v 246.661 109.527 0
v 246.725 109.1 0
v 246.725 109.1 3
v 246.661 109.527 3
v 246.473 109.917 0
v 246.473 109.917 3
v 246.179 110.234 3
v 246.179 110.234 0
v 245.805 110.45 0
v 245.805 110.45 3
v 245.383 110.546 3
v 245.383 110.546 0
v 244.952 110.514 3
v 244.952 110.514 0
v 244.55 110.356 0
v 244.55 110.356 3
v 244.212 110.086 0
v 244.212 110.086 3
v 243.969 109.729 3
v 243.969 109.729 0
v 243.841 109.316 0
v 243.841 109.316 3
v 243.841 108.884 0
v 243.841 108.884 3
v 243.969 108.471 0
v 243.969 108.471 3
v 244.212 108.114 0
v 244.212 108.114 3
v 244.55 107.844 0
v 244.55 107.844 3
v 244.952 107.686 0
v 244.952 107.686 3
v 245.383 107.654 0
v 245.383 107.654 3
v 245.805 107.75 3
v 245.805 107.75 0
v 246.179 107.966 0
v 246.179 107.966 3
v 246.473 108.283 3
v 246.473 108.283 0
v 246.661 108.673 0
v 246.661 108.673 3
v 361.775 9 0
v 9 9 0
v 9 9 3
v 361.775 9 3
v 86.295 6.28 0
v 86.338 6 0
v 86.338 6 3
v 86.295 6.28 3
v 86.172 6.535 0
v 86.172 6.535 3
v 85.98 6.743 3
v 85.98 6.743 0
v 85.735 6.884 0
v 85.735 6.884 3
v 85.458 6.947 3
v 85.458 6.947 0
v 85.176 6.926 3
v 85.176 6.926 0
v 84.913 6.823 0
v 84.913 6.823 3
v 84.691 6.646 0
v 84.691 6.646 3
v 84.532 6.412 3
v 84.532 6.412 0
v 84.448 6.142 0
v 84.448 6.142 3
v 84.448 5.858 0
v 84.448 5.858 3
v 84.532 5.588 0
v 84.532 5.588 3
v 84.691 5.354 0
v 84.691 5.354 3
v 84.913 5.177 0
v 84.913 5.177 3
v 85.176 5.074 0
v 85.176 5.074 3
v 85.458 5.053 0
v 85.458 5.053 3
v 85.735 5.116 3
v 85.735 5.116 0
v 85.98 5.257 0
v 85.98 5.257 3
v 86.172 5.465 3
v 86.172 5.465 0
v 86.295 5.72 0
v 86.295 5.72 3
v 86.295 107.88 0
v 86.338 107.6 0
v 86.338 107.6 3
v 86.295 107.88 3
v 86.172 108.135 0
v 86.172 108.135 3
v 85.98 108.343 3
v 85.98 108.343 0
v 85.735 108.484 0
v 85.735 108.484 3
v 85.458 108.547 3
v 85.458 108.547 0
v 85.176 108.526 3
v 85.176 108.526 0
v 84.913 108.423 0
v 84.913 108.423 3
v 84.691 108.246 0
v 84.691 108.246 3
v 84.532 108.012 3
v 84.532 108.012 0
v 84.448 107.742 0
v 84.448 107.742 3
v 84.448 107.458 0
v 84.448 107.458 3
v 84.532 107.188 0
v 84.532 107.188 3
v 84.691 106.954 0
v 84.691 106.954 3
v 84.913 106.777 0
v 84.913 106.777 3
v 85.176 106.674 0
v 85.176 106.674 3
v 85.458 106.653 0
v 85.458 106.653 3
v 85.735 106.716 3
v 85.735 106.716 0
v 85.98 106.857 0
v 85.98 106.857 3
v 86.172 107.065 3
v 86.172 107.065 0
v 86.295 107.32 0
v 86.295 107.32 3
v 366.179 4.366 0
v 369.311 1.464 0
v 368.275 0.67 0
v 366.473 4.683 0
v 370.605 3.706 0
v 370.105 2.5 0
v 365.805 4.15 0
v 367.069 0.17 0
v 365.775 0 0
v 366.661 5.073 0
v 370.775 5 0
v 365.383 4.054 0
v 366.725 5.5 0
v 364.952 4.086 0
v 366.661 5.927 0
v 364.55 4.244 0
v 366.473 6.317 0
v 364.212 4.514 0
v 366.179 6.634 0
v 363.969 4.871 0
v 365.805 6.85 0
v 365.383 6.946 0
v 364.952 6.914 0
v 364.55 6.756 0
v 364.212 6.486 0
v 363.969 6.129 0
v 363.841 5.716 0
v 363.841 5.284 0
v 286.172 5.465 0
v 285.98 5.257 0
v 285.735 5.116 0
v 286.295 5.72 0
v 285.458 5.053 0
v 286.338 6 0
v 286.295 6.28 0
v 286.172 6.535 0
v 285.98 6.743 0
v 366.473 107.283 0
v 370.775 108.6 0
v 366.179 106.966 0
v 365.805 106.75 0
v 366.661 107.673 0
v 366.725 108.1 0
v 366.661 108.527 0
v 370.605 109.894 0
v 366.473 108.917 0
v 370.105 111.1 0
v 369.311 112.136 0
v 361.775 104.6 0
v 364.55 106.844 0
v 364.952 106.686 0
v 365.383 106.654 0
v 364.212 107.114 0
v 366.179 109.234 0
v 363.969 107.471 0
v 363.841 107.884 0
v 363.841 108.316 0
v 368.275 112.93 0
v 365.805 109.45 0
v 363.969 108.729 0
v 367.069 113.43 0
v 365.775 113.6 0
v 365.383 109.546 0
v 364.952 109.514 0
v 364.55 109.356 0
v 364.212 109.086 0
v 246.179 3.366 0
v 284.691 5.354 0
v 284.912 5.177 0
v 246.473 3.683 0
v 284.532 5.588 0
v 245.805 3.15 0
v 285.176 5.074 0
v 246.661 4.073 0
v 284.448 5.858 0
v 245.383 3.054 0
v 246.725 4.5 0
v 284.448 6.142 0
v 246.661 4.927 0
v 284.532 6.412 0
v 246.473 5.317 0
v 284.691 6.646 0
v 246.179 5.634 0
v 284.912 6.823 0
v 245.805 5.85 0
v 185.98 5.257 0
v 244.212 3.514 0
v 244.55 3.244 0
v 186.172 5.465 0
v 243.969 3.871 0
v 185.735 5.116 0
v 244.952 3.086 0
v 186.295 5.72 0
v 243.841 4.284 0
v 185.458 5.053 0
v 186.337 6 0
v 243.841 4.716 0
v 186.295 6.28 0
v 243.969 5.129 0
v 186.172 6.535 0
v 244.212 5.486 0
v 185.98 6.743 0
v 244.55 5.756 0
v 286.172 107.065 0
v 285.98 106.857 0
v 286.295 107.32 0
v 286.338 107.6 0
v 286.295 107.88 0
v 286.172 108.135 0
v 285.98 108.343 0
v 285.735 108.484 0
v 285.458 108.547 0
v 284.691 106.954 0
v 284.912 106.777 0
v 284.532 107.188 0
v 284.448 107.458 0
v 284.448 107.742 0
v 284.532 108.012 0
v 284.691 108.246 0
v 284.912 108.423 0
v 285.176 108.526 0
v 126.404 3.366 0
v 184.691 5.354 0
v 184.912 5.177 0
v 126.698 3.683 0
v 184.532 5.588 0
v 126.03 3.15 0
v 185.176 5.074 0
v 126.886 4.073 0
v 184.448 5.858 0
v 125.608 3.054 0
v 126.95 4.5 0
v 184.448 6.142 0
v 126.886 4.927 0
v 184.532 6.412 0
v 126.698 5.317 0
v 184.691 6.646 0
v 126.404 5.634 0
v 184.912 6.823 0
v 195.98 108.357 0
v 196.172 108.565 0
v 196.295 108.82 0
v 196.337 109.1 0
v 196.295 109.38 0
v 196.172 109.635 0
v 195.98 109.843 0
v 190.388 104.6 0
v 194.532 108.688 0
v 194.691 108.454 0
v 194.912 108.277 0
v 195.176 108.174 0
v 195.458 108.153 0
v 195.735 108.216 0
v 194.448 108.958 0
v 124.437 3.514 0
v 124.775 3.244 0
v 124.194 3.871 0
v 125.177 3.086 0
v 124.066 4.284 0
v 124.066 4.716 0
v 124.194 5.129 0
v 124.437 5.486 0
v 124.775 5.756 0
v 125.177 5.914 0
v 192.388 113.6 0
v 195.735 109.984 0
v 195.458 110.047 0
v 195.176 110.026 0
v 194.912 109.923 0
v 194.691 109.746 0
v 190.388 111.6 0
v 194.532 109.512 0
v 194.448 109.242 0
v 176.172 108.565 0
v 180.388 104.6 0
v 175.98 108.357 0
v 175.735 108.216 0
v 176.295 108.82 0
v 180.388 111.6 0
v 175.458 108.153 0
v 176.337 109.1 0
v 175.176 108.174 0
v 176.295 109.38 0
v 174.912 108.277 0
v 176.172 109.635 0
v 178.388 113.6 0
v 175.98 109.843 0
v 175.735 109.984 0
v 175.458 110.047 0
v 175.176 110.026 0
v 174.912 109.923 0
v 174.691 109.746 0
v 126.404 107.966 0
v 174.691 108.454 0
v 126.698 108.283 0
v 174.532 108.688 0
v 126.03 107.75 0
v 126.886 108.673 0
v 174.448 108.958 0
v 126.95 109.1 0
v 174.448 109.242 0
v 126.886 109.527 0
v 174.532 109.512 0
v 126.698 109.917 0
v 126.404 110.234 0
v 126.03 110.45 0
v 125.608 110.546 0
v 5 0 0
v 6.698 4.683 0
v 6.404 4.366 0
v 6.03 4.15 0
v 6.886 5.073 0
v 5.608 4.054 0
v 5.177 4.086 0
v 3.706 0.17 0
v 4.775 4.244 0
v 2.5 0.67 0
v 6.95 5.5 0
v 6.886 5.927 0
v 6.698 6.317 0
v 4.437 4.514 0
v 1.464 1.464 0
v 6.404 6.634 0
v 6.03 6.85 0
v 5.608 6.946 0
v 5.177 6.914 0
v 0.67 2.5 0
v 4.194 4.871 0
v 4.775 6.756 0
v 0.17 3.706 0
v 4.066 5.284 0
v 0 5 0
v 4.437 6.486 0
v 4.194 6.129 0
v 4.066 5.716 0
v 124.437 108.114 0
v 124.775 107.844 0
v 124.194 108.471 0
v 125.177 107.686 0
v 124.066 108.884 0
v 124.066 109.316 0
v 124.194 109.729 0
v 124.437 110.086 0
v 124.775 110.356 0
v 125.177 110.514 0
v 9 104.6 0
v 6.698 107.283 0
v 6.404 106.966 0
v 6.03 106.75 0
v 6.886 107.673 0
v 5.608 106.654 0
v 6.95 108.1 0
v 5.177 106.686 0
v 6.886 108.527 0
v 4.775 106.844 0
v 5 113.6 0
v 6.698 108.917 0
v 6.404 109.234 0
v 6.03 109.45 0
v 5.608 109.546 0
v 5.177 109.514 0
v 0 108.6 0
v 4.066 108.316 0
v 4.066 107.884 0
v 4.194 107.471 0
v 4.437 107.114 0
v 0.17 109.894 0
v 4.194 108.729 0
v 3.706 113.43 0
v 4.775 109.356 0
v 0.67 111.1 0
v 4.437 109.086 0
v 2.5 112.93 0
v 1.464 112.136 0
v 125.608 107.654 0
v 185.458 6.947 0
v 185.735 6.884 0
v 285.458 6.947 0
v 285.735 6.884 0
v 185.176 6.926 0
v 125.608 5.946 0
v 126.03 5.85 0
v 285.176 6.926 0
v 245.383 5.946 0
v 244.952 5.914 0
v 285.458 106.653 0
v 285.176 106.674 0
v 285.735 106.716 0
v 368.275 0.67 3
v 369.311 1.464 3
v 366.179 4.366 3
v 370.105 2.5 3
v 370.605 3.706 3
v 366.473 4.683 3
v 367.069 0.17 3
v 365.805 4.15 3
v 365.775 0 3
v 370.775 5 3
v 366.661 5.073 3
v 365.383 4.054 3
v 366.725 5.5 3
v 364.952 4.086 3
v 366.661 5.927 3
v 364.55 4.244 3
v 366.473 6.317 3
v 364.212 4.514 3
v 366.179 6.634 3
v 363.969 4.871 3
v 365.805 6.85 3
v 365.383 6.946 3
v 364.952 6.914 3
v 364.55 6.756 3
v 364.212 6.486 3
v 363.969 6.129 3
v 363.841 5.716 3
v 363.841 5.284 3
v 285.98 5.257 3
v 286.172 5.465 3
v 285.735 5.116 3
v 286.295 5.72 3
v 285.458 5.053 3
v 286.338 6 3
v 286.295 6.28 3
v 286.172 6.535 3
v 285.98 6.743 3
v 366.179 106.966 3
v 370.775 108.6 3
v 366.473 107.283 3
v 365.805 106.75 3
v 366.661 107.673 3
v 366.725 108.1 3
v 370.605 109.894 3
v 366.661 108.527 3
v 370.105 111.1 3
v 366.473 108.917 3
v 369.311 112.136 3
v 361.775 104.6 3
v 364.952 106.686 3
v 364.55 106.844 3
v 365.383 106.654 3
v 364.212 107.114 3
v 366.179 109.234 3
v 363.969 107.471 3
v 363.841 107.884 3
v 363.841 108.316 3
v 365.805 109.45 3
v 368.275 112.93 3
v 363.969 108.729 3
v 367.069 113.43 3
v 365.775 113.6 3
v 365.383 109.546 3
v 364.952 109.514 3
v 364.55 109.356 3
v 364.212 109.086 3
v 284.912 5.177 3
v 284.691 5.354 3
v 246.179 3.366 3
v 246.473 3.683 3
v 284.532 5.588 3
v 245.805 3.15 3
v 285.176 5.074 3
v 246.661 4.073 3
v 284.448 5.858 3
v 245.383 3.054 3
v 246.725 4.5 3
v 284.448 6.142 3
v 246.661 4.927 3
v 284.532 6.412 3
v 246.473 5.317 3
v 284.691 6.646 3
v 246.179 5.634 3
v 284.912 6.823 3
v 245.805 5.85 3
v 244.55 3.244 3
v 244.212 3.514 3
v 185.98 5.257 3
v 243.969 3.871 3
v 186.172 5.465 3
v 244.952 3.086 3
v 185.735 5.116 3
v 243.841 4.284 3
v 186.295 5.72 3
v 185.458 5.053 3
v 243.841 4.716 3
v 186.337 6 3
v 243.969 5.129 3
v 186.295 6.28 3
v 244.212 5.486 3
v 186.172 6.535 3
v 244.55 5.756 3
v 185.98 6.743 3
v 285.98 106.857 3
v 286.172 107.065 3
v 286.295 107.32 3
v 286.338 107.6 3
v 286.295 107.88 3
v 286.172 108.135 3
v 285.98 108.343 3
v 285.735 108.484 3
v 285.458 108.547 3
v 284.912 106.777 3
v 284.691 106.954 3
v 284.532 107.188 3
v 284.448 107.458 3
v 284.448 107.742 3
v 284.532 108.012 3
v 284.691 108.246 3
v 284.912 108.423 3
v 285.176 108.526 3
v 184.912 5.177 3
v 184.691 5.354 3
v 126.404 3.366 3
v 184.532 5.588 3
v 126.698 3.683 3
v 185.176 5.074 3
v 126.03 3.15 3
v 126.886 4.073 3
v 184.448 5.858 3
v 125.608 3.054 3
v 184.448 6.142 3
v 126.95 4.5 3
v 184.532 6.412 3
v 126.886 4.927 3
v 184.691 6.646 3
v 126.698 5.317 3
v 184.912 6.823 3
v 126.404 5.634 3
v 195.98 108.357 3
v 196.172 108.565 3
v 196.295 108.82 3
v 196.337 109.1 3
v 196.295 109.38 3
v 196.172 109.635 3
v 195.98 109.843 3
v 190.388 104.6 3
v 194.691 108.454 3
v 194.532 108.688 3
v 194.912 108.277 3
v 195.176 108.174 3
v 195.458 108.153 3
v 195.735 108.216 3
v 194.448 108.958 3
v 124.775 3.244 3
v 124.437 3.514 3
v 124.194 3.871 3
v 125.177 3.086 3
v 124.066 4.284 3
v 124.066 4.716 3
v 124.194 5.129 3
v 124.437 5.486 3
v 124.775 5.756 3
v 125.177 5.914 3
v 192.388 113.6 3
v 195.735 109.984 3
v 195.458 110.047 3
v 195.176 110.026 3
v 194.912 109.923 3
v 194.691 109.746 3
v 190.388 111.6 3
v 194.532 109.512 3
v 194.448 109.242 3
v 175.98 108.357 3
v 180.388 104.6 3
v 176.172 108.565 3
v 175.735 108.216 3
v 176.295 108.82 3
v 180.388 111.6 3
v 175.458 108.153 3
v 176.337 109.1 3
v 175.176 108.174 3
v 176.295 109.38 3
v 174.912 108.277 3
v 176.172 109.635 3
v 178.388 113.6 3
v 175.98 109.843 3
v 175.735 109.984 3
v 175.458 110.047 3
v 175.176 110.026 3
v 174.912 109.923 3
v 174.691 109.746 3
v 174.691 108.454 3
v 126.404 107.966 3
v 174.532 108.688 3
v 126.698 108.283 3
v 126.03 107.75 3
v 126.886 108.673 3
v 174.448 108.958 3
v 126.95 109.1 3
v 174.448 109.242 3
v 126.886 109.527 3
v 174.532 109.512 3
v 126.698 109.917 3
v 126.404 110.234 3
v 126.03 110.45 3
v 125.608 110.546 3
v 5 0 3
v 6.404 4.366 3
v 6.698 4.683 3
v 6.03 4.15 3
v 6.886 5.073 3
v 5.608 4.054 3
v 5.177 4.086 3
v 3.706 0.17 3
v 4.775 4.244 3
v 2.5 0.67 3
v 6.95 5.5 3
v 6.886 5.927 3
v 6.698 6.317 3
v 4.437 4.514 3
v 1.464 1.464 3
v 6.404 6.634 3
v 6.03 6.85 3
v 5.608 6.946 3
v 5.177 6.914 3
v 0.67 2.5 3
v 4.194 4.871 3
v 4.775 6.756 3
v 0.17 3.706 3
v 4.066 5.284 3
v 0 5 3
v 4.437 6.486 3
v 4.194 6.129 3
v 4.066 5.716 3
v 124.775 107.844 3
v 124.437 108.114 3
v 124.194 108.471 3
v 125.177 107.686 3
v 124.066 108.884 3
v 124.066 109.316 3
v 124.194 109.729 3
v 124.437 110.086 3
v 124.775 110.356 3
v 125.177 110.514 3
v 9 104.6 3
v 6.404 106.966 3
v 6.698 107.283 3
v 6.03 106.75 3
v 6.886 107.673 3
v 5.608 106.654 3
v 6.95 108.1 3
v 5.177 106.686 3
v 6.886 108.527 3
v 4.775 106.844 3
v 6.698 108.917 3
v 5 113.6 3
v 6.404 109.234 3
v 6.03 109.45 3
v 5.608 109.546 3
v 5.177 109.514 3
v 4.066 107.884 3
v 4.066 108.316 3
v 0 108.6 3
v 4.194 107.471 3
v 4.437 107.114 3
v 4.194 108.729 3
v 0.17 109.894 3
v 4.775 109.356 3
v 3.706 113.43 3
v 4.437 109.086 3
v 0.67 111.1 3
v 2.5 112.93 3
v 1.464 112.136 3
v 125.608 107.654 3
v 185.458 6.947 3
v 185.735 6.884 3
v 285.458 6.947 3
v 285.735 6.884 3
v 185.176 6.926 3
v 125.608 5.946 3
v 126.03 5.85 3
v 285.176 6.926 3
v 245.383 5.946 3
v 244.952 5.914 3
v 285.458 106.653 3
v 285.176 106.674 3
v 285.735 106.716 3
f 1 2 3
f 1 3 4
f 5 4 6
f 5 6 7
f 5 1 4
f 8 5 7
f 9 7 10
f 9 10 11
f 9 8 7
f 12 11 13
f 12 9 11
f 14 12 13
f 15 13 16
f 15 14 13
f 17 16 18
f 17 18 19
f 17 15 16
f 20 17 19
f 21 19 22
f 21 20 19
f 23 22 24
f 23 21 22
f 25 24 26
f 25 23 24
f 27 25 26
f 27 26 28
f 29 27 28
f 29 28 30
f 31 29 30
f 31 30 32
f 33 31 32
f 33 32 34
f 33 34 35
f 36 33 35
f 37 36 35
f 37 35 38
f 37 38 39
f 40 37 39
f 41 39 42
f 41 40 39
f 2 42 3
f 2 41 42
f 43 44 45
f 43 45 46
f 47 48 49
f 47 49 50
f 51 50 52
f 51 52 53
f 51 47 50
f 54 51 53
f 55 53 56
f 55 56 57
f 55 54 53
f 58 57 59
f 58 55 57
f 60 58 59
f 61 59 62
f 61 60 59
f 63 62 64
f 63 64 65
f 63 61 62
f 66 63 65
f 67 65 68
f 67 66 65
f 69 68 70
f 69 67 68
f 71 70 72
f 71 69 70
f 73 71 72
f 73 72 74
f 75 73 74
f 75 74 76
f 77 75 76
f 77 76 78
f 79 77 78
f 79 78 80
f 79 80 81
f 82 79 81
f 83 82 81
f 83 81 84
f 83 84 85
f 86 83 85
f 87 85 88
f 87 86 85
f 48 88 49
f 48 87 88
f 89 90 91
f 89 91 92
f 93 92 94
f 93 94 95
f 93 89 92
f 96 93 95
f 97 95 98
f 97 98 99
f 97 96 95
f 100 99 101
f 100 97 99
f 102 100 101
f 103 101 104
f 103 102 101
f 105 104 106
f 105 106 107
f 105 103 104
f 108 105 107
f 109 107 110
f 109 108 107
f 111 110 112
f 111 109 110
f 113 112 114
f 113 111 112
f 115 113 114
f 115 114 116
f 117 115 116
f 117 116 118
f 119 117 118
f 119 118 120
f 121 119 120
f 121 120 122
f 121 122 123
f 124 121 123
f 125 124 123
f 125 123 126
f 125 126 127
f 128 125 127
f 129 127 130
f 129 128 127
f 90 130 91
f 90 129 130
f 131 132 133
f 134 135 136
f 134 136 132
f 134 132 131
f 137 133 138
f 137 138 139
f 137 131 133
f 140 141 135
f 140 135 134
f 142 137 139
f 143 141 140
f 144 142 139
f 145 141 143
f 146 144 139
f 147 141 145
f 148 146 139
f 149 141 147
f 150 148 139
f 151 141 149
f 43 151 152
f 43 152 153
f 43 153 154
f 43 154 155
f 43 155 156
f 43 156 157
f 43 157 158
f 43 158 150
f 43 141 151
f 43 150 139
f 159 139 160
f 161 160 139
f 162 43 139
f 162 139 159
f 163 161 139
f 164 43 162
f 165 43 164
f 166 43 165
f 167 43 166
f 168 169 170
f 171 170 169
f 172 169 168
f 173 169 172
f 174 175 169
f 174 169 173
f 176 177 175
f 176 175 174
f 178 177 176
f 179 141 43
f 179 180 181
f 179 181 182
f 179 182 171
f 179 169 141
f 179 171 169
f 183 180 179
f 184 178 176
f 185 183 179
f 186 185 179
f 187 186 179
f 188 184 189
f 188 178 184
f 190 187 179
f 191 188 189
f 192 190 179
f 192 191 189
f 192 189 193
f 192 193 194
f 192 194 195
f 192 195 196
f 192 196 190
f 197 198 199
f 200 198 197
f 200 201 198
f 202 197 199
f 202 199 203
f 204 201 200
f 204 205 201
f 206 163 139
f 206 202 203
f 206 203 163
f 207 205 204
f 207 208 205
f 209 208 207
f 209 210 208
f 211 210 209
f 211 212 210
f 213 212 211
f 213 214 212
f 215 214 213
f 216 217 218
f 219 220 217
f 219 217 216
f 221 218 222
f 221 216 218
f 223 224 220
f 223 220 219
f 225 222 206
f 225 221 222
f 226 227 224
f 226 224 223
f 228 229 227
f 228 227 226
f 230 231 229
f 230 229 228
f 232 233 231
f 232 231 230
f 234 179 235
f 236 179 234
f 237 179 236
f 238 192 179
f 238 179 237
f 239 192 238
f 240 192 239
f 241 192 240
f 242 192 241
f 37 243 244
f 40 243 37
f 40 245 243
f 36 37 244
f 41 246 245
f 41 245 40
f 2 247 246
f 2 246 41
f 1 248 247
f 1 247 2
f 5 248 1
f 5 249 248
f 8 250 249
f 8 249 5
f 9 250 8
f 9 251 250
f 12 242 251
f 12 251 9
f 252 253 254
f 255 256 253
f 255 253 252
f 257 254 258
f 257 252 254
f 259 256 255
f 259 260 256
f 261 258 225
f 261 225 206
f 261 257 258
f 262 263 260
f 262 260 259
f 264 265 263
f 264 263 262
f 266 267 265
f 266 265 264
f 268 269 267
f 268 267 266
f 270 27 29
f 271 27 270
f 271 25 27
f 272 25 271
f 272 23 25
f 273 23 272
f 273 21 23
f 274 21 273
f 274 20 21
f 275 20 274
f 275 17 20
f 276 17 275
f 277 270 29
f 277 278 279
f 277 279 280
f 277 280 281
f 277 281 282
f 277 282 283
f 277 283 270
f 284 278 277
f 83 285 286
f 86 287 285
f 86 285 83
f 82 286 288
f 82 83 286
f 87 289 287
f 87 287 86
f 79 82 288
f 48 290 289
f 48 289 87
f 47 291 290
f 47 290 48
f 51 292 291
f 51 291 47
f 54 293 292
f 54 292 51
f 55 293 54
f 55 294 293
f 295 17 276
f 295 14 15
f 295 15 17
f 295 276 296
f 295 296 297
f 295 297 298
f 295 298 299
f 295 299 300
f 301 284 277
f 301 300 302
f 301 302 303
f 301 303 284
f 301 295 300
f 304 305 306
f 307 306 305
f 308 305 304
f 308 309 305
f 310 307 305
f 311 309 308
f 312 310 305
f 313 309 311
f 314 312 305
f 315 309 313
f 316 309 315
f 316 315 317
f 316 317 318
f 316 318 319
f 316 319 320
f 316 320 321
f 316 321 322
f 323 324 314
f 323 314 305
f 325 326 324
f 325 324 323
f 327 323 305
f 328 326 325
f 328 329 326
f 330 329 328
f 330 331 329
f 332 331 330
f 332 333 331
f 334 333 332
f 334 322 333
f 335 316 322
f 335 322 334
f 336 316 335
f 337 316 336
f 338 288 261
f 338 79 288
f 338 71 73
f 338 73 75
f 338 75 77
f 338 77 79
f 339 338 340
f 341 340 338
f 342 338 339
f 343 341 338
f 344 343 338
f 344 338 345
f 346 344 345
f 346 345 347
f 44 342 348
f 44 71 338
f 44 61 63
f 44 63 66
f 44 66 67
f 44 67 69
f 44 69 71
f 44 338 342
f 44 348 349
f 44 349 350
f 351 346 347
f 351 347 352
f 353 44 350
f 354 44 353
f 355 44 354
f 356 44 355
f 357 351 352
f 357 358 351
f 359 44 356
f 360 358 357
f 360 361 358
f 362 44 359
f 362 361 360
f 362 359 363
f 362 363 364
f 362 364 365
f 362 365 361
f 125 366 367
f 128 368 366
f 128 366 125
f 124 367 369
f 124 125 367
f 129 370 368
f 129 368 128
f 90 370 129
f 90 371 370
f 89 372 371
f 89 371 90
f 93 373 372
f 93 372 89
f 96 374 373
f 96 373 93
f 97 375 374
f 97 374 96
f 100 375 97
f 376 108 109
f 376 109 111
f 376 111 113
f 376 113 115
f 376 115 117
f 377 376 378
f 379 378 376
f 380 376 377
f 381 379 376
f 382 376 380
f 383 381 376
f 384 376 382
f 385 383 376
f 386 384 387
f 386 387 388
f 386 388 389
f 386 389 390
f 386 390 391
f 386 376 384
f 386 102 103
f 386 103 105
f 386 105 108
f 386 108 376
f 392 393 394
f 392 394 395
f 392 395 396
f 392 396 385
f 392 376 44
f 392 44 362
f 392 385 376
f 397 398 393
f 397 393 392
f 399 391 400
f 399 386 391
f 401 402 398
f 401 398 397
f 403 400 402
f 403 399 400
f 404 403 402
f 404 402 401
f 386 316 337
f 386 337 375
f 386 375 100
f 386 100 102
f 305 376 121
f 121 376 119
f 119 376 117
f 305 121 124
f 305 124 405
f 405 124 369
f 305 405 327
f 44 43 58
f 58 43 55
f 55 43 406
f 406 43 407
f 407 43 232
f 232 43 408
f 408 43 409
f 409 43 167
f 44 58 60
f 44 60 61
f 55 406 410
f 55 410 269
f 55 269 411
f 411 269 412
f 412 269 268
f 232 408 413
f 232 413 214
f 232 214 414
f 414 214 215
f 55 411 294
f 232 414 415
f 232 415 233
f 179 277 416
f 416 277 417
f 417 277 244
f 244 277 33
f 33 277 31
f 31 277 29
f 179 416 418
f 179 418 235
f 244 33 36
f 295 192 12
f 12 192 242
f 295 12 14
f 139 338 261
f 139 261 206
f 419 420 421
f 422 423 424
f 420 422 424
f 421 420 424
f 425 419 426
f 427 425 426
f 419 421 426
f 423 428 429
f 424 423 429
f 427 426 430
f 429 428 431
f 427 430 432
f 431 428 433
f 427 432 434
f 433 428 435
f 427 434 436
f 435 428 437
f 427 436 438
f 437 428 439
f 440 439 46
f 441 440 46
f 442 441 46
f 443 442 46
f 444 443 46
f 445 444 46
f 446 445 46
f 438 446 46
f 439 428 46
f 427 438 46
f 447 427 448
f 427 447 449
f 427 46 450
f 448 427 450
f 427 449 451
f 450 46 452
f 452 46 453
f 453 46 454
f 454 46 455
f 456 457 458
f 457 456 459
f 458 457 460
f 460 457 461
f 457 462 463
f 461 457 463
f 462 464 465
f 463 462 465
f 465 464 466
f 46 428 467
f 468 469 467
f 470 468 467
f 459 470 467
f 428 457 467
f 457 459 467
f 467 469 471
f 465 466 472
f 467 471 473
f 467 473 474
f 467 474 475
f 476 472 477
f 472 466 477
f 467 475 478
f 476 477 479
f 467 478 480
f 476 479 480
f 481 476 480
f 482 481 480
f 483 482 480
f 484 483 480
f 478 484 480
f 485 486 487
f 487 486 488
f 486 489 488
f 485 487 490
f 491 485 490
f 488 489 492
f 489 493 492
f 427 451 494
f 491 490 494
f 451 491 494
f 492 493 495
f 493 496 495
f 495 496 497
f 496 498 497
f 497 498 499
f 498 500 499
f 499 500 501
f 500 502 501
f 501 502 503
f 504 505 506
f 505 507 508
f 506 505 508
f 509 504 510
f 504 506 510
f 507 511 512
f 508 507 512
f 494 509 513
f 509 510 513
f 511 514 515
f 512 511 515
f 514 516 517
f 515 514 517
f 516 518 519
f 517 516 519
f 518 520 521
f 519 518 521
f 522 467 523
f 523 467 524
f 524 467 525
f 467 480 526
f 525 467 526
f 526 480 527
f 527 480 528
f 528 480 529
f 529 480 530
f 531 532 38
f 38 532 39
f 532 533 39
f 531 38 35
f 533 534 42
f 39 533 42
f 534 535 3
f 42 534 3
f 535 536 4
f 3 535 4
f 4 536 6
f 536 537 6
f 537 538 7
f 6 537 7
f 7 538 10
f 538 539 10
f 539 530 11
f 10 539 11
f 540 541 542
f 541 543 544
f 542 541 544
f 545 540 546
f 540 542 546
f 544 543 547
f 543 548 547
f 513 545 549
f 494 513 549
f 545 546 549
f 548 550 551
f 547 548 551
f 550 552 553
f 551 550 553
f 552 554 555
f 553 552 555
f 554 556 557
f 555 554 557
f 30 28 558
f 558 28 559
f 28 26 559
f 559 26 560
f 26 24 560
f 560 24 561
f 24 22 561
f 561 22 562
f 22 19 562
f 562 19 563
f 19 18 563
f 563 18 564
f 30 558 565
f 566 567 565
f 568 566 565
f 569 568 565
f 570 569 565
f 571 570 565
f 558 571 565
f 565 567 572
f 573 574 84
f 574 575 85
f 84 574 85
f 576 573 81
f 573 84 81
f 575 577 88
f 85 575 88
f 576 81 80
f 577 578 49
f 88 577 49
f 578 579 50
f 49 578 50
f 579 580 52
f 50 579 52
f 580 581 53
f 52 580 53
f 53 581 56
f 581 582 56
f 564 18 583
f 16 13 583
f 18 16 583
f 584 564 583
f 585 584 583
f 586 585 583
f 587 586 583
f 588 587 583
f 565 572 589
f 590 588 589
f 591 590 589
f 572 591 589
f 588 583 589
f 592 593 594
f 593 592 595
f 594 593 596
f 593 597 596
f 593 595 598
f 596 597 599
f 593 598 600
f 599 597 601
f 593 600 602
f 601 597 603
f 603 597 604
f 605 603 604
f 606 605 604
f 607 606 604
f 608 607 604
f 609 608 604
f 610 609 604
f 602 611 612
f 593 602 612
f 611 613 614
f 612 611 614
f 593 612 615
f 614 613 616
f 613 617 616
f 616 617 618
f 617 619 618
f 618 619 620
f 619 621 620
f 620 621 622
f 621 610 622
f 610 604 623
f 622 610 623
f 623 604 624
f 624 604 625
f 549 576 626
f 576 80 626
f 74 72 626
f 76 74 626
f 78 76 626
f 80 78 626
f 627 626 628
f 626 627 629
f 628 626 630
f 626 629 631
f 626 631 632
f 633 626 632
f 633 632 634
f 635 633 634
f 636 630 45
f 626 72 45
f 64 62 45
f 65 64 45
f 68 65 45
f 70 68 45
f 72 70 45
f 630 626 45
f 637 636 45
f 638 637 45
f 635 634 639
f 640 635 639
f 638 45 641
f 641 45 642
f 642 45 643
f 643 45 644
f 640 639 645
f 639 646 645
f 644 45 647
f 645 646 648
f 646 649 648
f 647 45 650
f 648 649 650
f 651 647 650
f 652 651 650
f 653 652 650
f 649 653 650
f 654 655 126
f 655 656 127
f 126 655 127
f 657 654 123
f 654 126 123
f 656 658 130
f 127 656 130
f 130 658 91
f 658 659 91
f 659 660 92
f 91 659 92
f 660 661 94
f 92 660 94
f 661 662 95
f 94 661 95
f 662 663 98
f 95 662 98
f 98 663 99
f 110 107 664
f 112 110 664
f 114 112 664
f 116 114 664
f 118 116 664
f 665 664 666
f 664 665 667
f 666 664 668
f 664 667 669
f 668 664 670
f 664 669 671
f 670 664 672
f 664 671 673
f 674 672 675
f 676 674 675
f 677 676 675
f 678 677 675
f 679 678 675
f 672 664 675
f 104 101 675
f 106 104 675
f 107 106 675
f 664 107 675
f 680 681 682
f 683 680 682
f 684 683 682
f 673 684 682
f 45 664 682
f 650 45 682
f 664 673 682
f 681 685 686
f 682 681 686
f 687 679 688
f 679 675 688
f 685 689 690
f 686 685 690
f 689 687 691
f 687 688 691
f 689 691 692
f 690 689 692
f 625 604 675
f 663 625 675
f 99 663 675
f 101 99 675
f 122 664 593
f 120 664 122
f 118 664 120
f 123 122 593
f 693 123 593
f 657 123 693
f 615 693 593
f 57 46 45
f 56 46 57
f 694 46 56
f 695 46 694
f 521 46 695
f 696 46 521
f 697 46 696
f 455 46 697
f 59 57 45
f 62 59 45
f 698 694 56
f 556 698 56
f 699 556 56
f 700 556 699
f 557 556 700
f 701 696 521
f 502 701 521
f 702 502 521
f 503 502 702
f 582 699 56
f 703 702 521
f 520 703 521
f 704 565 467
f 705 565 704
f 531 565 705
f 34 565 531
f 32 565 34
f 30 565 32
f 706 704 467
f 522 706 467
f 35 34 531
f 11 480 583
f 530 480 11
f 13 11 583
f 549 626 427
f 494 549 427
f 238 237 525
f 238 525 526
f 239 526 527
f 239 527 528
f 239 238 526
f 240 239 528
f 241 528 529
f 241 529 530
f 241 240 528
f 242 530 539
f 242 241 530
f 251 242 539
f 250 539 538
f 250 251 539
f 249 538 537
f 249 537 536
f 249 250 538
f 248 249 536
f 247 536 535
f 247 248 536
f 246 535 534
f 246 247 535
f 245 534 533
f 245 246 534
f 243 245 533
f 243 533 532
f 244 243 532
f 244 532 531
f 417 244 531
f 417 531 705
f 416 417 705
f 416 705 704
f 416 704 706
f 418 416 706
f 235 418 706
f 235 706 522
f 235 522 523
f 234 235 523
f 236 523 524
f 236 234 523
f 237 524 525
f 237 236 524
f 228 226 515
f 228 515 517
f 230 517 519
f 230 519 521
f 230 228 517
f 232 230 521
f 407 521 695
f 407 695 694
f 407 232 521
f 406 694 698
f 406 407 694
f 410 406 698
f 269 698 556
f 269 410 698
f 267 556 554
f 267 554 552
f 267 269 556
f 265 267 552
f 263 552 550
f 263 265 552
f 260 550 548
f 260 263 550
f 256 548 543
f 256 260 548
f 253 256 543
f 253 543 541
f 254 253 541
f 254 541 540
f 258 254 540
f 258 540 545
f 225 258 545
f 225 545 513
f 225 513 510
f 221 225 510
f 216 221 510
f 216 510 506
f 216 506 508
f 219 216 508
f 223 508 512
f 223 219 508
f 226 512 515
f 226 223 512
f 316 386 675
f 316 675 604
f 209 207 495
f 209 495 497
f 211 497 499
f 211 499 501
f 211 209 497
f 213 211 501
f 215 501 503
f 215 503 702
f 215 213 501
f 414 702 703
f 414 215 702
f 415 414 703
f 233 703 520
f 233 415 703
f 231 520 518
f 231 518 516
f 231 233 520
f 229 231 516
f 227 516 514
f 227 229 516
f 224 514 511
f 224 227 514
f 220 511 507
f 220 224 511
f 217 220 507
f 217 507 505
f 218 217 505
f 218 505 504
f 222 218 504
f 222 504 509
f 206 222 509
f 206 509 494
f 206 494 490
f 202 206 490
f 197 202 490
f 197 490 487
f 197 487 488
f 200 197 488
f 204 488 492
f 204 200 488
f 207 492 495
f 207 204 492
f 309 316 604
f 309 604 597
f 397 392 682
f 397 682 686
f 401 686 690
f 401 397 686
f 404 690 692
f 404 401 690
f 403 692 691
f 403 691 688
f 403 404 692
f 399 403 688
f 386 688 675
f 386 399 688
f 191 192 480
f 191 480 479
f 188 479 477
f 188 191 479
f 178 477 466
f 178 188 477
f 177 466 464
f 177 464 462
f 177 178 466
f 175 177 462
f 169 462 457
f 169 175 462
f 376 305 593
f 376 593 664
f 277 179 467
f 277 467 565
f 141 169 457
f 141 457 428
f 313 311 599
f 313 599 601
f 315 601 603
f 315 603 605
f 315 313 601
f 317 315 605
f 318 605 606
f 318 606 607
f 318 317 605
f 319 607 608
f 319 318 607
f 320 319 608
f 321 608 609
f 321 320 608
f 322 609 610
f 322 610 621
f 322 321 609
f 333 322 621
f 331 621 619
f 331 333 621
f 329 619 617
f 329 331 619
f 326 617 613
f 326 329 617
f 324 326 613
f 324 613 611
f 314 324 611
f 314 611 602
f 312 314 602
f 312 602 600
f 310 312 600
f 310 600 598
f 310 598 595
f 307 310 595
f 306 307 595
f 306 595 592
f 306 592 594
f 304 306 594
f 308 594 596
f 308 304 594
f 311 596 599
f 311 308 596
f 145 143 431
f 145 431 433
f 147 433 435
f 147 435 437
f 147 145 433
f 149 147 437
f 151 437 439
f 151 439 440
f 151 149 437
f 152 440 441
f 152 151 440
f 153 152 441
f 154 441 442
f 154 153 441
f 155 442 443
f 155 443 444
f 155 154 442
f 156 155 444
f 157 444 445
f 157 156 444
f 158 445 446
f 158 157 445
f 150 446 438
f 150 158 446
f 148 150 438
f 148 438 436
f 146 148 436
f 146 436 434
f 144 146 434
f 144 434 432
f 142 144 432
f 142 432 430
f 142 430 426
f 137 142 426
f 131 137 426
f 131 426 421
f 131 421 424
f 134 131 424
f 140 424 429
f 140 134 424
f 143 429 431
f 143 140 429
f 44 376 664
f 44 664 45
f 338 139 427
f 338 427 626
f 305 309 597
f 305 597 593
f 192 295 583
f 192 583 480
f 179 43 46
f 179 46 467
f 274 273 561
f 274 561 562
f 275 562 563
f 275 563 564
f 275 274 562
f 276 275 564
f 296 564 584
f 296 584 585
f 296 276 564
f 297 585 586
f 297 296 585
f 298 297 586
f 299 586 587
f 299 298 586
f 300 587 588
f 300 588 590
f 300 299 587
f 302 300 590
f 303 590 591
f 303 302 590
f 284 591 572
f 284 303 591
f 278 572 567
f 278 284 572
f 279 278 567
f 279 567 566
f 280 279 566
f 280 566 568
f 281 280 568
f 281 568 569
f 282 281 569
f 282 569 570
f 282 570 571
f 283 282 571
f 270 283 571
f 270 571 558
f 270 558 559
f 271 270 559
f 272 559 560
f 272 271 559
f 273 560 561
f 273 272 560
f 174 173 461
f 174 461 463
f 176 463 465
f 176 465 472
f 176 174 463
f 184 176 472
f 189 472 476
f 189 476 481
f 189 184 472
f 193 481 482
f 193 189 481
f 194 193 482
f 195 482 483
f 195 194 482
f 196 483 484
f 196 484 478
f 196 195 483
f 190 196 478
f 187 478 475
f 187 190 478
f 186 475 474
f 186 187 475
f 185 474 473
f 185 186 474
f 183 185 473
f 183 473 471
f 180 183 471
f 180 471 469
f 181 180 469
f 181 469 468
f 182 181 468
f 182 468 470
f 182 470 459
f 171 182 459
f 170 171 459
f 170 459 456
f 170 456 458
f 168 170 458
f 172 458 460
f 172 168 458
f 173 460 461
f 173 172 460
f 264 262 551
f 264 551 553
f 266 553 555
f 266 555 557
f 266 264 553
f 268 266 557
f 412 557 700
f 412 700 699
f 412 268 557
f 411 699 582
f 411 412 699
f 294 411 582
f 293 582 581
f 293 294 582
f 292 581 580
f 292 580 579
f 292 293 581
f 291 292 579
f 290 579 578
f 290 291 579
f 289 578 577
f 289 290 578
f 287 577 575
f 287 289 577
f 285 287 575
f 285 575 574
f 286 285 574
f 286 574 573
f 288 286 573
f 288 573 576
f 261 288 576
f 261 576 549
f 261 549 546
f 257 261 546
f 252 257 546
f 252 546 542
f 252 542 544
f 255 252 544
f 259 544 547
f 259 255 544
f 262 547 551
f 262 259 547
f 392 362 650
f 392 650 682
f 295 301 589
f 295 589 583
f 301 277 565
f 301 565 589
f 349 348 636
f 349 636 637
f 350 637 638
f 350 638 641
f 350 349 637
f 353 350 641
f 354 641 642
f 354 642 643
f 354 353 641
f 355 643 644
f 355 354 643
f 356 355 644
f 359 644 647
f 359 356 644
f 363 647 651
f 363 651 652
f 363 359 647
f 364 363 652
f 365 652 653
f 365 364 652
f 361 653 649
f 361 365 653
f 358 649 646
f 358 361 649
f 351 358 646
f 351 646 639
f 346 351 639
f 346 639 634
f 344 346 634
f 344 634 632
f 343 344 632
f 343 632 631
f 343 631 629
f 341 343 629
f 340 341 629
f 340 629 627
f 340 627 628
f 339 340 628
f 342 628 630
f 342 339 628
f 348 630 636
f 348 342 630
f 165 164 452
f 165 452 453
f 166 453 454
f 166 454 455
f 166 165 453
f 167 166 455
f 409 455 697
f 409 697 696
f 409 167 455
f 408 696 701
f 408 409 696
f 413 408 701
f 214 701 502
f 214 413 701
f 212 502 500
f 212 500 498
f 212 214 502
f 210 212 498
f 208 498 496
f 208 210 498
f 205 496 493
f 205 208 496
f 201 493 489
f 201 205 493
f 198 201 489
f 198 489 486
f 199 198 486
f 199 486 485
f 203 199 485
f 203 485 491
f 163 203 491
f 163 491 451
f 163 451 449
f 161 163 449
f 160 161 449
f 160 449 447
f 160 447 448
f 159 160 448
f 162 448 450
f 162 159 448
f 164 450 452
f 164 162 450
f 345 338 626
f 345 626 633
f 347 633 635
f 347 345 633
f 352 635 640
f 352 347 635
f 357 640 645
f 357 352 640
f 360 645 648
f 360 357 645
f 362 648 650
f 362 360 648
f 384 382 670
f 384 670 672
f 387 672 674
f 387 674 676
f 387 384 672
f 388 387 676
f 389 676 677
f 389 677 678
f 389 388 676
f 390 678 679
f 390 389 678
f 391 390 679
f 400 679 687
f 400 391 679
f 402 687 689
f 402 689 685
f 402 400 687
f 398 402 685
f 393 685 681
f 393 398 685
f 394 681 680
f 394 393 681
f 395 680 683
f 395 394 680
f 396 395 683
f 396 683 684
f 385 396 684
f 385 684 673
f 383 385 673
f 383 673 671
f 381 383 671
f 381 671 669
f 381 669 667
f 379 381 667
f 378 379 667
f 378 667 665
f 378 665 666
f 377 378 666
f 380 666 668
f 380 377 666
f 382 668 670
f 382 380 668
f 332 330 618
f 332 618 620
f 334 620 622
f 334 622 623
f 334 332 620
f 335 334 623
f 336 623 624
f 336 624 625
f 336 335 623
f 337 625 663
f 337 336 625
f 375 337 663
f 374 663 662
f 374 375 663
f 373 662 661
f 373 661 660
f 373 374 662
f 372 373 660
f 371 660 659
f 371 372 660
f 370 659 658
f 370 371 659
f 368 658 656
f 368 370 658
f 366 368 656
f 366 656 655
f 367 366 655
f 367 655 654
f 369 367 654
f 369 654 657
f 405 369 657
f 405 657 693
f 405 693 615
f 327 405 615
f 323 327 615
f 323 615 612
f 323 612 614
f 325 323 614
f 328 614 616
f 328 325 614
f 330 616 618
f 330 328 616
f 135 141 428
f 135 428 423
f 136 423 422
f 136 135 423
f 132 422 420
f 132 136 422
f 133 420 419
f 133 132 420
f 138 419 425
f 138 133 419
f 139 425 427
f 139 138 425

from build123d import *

# Parameters (mm, degrees)
MODEL_R             = 1.45
MODEL_R_2           = 0.95
BOSS_EXTRUDE1_DEPTH = 3


with BuildPart() as part:
    # Model → Boss-Extrude1 (new body)
    with BuildSketch(Plane.XY):
        with BuildLine():
            Line((5, 113.6), (178.3875, 113.6))
            Line((178.3875, 113.6), (180.3875, 111.6))
            Line((180.3875, 111.6), (180.3875, 104.6))
            Line((180.3875, 104.6), (9, 104.6))
            Line((9, 104.6), (9, 9))
            Line((9, 9), (361.775, 9))
            Line((361.775, 9), (361.775, 104.6))
            Line((361.775, 104.6), (190.3875, 104.6))
            Line((190.3875, 104.6), (190.3875, 111.6))
            Line((190.3875, 111.6), (192.3875, 113.6))
            Line((192.3875, 113.6), (365.775, 113.6))
            ThreePointArc((365.775, 113.6), (369.310533906, 112.135533906), (370.775, 108.6))
            Line((370.775, 108.6), (370.775, 5))
            ThreePointArc((370.775, 5), (369.310533906, 1.464466094), (365.775, 0))
            Line((365.775, 0), (5, 0))
            ThreePointArc((5, 0), (1.464466094, 1.464466094), (0, 5))
            Line((0, 5), (0, 108.6))
            ThreePointArc((0, 108.6), (1.464466094, 112.135533906), (5, 113.6))
        make_face()
        with Locations((245.275, 109.1)):
            Circle(MODEL_R, mode=Mode.SUBTRACT)
        with Locations((125.5, 109.1)):
            Circle(MODEL_R, mode=Mode.SUBTRACT)
        with Locations((245.275, 4.5)):
            Circle(MODEL_R, mode=Mode.SUBTRACT)
        with Locations((285.3875, 6)):
            Circle(MODEL_R_2, mode=Mode.SUBTRACT)
        with Locations((185.3875, 6)):
            Circle(MODEL_R_2, mode=Mode.SUBTRACT)
        with Locations((85.3875, 6)):
            Circle(MODEL_R_2, mode=Mode.SUBTRACT)
        with Locations((285.3875, 107.6)):
            Circle(MODEL_R_2, mode=Mode.SUBTRACT)
        with Locations((85.3875, 107.6)):
            Circle(MODEL_R_2, mode=Mode.SUBTRACT)
        with Locations((365.275, 108.1)):
            Circle(MODEL_R, mode=Mode.SUBTRACT)
        with Locations((365.275, 5.5)):
            Circle(MODEL_R, mode=Mode.SUBTRACT)
        with Locations((5.5, 5.5)):
            Circle(MODEL_R, mode=Mode.SUBTRACT)
        with Locations((5.5, 108.1)):
            Circle(MODEL_R, mode=Mode.SUBTRACT)
        with Locations((175.3875, 109.1)):
            Circle(MODEL_R_2, mode=Mode.SUBTRACT)
        with Locations((195.3875, 109.1)):
            Circle(MODEL_R_2, mode=Mode.SUBTRACT)
        with Locations((125.5, 4.5)):
            Circle(MODEL_R, mode=Mode.SUBTRACT)
    extrude(amount=BOSS_EXTRUDE1_DEPTH)


solid = part.part
